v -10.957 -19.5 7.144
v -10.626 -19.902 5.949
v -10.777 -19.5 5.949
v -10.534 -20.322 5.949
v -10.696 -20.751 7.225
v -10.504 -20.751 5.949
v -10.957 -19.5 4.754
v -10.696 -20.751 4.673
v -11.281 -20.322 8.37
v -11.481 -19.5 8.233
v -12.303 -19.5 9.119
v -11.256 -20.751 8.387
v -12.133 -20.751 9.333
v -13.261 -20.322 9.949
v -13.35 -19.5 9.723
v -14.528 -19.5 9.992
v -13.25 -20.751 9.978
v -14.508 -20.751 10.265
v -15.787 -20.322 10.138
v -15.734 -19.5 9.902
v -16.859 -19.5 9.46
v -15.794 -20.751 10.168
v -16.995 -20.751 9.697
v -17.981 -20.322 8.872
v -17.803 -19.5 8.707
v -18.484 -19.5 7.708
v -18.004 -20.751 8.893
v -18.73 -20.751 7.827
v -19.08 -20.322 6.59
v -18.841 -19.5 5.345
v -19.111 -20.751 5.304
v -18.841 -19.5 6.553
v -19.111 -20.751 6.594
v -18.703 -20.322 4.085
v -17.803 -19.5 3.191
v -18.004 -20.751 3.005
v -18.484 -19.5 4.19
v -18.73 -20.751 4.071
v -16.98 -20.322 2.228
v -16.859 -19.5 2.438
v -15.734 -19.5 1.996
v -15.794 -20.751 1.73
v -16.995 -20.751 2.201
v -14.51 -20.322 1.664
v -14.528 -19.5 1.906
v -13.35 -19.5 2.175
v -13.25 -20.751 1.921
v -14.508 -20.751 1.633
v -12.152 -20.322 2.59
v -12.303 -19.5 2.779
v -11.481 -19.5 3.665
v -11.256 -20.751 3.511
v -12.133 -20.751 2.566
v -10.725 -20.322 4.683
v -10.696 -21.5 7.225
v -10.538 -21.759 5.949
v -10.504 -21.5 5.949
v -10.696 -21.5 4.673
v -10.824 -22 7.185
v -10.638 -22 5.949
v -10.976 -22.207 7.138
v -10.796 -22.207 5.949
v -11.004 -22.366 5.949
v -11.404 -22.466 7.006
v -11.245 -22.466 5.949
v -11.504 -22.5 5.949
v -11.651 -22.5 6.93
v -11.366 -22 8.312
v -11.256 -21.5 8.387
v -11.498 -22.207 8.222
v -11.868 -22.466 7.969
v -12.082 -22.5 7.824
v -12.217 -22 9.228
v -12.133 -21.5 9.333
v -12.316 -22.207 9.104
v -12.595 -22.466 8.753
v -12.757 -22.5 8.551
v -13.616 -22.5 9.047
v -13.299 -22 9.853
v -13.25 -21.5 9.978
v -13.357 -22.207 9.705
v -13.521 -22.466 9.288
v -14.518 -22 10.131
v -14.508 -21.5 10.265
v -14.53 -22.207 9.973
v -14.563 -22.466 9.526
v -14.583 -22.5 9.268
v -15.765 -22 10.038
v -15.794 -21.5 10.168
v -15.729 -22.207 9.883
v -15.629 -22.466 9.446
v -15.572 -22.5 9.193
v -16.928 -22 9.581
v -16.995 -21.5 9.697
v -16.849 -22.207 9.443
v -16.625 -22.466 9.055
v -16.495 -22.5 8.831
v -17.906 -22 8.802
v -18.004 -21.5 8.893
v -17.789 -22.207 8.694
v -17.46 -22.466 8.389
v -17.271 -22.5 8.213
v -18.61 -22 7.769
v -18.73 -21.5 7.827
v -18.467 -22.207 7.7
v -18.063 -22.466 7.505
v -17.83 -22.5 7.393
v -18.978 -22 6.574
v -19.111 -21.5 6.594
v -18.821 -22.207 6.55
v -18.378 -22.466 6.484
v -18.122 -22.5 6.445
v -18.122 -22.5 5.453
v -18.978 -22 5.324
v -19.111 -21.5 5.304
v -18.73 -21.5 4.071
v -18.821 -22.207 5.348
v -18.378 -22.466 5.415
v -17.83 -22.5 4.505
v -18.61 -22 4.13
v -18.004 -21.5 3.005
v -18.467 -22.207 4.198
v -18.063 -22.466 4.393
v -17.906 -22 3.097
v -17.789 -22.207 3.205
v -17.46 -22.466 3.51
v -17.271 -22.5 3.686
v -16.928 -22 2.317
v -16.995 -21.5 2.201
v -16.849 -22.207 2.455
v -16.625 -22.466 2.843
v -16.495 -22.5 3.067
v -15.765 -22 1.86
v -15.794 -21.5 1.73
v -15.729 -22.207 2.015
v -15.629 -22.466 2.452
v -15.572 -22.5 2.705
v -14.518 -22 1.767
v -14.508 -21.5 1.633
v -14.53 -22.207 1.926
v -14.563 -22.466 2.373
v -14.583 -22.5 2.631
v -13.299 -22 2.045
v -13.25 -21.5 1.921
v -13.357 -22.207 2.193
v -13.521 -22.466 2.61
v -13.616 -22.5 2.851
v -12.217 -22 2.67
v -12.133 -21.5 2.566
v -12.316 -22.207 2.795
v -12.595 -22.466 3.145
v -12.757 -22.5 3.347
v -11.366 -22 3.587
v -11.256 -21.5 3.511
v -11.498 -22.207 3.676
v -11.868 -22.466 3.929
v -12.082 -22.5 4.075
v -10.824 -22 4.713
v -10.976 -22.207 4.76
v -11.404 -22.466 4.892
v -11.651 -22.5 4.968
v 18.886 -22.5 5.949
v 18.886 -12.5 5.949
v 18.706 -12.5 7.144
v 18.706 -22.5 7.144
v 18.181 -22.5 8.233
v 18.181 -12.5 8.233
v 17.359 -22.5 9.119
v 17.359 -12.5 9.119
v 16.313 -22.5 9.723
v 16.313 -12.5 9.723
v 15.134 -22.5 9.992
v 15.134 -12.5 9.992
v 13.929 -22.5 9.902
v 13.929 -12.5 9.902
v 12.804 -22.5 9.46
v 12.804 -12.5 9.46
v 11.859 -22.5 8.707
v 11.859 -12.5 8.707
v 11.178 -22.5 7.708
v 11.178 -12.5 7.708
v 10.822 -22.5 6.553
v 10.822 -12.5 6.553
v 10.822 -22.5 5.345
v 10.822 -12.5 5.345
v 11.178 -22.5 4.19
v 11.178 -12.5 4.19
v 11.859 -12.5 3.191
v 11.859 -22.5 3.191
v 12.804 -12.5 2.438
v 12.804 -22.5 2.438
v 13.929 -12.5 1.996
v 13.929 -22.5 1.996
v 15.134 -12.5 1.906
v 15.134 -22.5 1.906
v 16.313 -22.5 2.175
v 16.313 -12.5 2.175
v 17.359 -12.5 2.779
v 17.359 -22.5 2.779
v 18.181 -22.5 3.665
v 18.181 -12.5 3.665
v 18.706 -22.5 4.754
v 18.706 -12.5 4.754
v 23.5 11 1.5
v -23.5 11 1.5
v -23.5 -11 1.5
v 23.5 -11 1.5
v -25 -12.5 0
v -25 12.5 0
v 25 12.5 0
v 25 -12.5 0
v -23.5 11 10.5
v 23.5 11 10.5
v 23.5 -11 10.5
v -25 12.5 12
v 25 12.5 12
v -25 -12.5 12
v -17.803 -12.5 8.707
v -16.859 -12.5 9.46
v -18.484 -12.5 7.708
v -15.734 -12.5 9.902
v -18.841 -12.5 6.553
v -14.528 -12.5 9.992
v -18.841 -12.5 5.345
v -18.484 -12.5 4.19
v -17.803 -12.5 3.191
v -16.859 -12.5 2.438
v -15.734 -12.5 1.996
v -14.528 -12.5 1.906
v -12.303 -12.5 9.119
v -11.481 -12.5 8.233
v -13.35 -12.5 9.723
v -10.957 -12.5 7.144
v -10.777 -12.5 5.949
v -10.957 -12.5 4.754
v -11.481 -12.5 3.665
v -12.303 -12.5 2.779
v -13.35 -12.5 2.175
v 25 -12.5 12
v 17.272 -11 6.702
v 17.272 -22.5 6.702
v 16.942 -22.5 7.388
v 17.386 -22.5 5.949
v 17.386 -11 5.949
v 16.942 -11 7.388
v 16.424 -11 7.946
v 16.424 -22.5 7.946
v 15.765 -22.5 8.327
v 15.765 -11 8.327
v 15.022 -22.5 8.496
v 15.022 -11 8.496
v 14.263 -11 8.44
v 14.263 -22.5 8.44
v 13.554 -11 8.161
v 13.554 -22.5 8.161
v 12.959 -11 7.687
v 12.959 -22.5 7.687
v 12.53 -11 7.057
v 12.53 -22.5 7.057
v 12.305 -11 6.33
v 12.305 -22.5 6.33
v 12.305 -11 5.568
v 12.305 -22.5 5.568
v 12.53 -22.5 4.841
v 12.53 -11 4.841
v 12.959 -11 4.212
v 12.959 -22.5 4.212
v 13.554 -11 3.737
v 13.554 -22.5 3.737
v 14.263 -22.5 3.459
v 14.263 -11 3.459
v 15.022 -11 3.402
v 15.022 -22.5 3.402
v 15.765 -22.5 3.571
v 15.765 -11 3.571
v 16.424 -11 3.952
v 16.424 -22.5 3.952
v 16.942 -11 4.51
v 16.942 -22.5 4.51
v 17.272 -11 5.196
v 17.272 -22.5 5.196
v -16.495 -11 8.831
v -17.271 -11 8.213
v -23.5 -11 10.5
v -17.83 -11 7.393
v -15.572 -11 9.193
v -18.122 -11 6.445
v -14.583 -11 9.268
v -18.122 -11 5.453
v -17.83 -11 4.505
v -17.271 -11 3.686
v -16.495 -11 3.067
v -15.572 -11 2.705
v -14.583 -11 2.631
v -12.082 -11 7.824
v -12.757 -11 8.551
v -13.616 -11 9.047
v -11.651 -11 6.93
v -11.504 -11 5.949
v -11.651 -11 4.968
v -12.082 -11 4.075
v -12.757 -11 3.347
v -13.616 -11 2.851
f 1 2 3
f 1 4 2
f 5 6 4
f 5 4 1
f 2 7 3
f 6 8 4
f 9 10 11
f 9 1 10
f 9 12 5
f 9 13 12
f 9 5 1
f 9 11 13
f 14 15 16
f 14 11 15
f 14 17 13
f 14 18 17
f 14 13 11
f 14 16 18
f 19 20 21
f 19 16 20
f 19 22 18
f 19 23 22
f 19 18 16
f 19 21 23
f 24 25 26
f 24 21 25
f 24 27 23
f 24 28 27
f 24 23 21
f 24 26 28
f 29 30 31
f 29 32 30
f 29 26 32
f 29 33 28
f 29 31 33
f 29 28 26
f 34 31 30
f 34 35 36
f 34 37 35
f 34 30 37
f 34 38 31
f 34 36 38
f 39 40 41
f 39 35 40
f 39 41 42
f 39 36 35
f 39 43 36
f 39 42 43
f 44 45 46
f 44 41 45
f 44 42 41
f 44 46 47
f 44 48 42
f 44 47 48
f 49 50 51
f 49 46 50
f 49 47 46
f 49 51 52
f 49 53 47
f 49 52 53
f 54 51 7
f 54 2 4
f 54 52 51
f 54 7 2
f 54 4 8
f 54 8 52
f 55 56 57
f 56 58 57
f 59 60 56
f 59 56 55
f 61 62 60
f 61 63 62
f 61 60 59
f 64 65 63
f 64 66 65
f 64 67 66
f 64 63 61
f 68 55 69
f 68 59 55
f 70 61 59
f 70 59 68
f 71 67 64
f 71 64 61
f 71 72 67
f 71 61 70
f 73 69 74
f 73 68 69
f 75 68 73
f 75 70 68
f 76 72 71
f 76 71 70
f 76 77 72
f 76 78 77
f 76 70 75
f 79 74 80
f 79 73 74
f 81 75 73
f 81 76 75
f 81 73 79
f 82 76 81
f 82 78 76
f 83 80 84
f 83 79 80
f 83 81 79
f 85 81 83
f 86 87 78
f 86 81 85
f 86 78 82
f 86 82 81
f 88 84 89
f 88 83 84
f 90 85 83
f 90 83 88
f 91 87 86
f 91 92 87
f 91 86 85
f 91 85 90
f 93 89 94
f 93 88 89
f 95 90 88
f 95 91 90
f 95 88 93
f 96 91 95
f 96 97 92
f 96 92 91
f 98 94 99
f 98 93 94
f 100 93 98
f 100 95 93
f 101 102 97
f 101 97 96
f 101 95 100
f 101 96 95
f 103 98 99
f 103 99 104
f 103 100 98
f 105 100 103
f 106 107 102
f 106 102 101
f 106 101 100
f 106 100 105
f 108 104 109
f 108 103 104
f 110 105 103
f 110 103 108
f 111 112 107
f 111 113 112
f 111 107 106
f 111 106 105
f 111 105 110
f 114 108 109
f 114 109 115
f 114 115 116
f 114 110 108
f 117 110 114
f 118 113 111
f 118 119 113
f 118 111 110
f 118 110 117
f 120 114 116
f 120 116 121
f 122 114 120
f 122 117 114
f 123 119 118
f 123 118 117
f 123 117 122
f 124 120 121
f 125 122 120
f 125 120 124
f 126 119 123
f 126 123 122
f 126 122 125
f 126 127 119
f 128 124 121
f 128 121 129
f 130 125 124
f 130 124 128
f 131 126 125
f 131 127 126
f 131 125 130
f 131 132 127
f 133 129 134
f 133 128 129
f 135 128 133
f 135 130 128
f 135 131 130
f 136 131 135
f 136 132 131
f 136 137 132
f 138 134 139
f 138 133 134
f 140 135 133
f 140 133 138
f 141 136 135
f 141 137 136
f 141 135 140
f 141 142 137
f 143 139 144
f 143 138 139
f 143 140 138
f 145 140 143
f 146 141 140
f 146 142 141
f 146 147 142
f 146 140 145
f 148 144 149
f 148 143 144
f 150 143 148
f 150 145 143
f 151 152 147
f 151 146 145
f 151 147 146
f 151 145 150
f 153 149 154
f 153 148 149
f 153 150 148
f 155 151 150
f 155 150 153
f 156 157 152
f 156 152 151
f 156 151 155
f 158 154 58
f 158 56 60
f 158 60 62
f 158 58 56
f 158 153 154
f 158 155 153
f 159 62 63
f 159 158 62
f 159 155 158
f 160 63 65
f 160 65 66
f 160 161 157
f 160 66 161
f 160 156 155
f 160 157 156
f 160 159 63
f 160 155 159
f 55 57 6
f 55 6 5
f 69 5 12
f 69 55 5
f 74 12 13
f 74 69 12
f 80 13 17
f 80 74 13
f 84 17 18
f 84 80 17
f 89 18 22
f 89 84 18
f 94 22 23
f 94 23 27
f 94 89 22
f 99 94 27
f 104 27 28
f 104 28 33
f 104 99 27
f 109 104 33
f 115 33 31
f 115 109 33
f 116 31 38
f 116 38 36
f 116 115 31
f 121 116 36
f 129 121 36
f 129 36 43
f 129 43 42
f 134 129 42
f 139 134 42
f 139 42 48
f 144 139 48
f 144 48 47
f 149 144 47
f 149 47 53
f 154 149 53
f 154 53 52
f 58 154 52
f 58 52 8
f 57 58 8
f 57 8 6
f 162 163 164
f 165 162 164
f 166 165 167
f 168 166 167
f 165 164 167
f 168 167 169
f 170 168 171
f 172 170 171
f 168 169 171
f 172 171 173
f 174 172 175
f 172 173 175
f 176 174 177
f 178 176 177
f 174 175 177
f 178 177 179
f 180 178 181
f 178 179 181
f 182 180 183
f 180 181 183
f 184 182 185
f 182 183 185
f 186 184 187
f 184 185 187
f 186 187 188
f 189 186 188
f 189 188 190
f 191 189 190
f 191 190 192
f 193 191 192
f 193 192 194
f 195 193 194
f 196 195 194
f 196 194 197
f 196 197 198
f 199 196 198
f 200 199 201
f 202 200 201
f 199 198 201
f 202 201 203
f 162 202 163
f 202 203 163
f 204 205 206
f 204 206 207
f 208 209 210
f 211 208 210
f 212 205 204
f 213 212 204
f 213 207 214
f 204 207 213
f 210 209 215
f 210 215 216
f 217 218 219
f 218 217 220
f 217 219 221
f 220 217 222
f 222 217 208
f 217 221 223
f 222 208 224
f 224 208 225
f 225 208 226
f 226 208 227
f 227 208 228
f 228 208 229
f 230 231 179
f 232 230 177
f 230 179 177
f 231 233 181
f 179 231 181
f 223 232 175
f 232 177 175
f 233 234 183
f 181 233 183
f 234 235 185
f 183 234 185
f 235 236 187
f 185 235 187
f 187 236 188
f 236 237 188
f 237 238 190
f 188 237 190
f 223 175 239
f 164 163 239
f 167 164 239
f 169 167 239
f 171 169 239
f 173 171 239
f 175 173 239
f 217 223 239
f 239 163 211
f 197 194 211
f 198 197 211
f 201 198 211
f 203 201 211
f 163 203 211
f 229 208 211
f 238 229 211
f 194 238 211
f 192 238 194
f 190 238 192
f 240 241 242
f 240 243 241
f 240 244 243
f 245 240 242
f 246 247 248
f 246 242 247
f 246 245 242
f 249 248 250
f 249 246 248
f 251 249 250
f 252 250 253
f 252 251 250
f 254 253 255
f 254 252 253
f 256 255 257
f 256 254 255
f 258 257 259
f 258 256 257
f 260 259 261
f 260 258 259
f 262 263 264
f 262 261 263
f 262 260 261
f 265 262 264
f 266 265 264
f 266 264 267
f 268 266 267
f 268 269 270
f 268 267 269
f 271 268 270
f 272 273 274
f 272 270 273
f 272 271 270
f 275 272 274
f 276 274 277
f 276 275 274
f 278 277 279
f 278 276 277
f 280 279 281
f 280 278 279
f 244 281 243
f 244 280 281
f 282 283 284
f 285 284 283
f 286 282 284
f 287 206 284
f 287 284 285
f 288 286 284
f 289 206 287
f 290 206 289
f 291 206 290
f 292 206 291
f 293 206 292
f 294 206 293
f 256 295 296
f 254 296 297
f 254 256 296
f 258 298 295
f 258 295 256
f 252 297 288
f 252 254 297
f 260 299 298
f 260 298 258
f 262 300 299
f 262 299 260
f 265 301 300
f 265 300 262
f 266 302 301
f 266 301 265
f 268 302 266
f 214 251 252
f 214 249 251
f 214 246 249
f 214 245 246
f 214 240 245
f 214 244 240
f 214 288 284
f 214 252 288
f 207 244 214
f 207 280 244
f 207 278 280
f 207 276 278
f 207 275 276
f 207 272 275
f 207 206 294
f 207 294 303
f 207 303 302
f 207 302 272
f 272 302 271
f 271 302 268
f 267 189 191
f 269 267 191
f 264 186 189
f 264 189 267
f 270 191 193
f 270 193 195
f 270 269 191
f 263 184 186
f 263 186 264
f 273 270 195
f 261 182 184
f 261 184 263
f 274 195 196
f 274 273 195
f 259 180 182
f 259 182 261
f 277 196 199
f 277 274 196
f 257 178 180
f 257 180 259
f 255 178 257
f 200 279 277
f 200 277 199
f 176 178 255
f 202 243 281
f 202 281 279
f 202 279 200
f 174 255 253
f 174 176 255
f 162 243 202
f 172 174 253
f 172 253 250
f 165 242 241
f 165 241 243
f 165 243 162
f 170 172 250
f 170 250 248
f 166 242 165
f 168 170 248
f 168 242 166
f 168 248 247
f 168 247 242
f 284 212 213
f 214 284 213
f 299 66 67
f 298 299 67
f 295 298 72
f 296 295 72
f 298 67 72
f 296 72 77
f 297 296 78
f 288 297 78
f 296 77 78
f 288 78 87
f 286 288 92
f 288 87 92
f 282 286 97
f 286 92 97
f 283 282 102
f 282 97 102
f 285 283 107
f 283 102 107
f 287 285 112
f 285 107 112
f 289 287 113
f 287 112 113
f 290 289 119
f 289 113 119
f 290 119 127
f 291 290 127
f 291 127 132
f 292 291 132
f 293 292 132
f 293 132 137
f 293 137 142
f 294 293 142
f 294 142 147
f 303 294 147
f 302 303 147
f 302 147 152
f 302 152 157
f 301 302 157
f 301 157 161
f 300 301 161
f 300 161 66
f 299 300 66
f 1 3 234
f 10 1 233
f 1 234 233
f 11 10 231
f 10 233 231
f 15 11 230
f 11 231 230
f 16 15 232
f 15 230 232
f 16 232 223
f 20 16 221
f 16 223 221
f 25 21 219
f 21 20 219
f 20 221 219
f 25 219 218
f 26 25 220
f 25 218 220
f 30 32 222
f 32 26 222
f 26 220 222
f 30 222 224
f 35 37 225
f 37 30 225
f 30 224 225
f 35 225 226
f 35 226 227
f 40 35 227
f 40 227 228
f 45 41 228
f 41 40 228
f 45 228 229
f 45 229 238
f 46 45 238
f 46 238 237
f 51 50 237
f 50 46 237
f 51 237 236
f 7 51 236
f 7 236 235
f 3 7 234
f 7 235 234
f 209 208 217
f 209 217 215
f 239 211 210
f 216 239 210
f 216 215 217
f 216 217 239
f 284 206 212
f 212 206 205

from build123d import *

# Parameters (mm, degrees)
F0_W     = 50
F0_H     = 25
F1_DEPTH = 12
F2_R     = 4.0545181675
F3_DEPTH = 10
F4_T     = -1.5
F5_R     = 4.327746069
F6_DEPTH = 3
F8_R     = 1
F9_DEPTH = 20


# Not quite as in the source:
# - a fillet or chamfer that OpenCascade refuses, or shapes differently, is made with other operations: its cross-section is extruded or revolved along the edge and cut away or added


with BuildPart() as f1:
    # F0 (on Top) → F1 (new body)
    with BuildSketch(Plane.XY):
        Rectangle(F0_W, F0_H)
    extrude(amount=F1_DEPTH)

    # F2 (on face) → F3 (join)
    with BuildSketch(Plane.XZ.offset(12.5)):
        with Locations((-14.8313278332, 5.9491097927)):
            Circle(F2_R)
        with Locations((14.8313278332, 5.9491097927)):
            Circle(F2_R)
    extrude(amount=F3_DEPTH)

    # F4
    f4_openings = [f1.faces().sort_by_distance(p)[0] for p in [
        (14.831328, -22.5, 5.94911),
        (-14.831328, -22.5, 5.94911),
    ]]
    offset(amount=F4_T, openings=f4_openings, kind=Kind.INTERSECTION)

    # F5 (on face) → F6 (join)
    with BuildSketch(Plane.XZ.offset(22.5)):
        with Locations((-14.8313278332, 5.9491097927)):
            Circle(F5_R)
    extrude(amount=-F6_DEPTH)

    # F7: fillet of radius 3 on 1 edges, made by hand

    # F7_s1 → F7_t2 (revolve, cut)
    with BuildSketch(Plane.XY.offset(5.9491097927)):
        with BuildLine():
            ThreePointArc((-10.7768096658, -19.5), (-10.5726846068, -20.1106963365), (-10.5035817643, -20.7508852557))
            Line((-10.5035817643, -20.7508852557), (-10.5035817643, -19.5))
            Line((-10.5035817643, -19.5), (-10.7768096658, -19.5))
        make_face()
    revolve(axis=Axis((-14.8313278332, -19.5, 5.9491097927), (0, -1, 0)), mode=Mode.SUBTRACT)

    # F8
    f8_edges = [f1.edges().sort_by_distance(p)[0] for p in [
        (-19.159074, -22.5, 5.94911),
    ]]
    fillet(f8_edges, radius=F8_R)

    # F9 (cut): a face of the model
    f9_faces = [f1.faces().sort_by_distance(p)[0] for p in [
        (-14.8313278332, -22.5, 5.9491097927),
    ]]
    extrude(f9_faces, amount=-F9_DEPTH, mode=Mode.SUBTRACT)


solid = f1.part
